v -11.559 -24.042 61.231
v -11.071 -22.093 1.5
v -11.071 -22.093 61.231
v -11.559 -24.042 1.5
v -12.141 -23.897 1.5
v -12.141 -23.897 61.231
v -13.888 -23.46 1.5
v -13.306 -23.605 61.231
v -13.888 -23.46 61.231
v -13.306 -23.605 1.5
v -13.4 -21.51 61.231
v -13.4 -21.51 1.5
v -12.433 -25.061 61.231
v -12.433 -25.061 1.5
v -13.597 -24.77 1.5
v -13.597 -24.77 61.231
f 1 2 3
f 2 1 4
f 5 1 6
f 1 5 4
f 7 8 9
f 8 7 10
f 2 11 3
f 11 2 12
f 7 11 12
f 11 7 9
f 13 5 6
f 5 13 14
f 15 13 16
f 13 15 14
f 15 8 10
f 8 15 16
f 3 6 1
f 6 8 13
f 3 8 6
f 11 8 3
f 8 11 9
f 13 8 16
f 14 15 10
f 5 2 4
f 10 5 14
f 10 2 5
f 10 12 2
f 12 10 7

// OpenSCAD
include <../lib/spool-drybox-lib.scad>;
$fn = 40;
ear_plate_front_gasket();
